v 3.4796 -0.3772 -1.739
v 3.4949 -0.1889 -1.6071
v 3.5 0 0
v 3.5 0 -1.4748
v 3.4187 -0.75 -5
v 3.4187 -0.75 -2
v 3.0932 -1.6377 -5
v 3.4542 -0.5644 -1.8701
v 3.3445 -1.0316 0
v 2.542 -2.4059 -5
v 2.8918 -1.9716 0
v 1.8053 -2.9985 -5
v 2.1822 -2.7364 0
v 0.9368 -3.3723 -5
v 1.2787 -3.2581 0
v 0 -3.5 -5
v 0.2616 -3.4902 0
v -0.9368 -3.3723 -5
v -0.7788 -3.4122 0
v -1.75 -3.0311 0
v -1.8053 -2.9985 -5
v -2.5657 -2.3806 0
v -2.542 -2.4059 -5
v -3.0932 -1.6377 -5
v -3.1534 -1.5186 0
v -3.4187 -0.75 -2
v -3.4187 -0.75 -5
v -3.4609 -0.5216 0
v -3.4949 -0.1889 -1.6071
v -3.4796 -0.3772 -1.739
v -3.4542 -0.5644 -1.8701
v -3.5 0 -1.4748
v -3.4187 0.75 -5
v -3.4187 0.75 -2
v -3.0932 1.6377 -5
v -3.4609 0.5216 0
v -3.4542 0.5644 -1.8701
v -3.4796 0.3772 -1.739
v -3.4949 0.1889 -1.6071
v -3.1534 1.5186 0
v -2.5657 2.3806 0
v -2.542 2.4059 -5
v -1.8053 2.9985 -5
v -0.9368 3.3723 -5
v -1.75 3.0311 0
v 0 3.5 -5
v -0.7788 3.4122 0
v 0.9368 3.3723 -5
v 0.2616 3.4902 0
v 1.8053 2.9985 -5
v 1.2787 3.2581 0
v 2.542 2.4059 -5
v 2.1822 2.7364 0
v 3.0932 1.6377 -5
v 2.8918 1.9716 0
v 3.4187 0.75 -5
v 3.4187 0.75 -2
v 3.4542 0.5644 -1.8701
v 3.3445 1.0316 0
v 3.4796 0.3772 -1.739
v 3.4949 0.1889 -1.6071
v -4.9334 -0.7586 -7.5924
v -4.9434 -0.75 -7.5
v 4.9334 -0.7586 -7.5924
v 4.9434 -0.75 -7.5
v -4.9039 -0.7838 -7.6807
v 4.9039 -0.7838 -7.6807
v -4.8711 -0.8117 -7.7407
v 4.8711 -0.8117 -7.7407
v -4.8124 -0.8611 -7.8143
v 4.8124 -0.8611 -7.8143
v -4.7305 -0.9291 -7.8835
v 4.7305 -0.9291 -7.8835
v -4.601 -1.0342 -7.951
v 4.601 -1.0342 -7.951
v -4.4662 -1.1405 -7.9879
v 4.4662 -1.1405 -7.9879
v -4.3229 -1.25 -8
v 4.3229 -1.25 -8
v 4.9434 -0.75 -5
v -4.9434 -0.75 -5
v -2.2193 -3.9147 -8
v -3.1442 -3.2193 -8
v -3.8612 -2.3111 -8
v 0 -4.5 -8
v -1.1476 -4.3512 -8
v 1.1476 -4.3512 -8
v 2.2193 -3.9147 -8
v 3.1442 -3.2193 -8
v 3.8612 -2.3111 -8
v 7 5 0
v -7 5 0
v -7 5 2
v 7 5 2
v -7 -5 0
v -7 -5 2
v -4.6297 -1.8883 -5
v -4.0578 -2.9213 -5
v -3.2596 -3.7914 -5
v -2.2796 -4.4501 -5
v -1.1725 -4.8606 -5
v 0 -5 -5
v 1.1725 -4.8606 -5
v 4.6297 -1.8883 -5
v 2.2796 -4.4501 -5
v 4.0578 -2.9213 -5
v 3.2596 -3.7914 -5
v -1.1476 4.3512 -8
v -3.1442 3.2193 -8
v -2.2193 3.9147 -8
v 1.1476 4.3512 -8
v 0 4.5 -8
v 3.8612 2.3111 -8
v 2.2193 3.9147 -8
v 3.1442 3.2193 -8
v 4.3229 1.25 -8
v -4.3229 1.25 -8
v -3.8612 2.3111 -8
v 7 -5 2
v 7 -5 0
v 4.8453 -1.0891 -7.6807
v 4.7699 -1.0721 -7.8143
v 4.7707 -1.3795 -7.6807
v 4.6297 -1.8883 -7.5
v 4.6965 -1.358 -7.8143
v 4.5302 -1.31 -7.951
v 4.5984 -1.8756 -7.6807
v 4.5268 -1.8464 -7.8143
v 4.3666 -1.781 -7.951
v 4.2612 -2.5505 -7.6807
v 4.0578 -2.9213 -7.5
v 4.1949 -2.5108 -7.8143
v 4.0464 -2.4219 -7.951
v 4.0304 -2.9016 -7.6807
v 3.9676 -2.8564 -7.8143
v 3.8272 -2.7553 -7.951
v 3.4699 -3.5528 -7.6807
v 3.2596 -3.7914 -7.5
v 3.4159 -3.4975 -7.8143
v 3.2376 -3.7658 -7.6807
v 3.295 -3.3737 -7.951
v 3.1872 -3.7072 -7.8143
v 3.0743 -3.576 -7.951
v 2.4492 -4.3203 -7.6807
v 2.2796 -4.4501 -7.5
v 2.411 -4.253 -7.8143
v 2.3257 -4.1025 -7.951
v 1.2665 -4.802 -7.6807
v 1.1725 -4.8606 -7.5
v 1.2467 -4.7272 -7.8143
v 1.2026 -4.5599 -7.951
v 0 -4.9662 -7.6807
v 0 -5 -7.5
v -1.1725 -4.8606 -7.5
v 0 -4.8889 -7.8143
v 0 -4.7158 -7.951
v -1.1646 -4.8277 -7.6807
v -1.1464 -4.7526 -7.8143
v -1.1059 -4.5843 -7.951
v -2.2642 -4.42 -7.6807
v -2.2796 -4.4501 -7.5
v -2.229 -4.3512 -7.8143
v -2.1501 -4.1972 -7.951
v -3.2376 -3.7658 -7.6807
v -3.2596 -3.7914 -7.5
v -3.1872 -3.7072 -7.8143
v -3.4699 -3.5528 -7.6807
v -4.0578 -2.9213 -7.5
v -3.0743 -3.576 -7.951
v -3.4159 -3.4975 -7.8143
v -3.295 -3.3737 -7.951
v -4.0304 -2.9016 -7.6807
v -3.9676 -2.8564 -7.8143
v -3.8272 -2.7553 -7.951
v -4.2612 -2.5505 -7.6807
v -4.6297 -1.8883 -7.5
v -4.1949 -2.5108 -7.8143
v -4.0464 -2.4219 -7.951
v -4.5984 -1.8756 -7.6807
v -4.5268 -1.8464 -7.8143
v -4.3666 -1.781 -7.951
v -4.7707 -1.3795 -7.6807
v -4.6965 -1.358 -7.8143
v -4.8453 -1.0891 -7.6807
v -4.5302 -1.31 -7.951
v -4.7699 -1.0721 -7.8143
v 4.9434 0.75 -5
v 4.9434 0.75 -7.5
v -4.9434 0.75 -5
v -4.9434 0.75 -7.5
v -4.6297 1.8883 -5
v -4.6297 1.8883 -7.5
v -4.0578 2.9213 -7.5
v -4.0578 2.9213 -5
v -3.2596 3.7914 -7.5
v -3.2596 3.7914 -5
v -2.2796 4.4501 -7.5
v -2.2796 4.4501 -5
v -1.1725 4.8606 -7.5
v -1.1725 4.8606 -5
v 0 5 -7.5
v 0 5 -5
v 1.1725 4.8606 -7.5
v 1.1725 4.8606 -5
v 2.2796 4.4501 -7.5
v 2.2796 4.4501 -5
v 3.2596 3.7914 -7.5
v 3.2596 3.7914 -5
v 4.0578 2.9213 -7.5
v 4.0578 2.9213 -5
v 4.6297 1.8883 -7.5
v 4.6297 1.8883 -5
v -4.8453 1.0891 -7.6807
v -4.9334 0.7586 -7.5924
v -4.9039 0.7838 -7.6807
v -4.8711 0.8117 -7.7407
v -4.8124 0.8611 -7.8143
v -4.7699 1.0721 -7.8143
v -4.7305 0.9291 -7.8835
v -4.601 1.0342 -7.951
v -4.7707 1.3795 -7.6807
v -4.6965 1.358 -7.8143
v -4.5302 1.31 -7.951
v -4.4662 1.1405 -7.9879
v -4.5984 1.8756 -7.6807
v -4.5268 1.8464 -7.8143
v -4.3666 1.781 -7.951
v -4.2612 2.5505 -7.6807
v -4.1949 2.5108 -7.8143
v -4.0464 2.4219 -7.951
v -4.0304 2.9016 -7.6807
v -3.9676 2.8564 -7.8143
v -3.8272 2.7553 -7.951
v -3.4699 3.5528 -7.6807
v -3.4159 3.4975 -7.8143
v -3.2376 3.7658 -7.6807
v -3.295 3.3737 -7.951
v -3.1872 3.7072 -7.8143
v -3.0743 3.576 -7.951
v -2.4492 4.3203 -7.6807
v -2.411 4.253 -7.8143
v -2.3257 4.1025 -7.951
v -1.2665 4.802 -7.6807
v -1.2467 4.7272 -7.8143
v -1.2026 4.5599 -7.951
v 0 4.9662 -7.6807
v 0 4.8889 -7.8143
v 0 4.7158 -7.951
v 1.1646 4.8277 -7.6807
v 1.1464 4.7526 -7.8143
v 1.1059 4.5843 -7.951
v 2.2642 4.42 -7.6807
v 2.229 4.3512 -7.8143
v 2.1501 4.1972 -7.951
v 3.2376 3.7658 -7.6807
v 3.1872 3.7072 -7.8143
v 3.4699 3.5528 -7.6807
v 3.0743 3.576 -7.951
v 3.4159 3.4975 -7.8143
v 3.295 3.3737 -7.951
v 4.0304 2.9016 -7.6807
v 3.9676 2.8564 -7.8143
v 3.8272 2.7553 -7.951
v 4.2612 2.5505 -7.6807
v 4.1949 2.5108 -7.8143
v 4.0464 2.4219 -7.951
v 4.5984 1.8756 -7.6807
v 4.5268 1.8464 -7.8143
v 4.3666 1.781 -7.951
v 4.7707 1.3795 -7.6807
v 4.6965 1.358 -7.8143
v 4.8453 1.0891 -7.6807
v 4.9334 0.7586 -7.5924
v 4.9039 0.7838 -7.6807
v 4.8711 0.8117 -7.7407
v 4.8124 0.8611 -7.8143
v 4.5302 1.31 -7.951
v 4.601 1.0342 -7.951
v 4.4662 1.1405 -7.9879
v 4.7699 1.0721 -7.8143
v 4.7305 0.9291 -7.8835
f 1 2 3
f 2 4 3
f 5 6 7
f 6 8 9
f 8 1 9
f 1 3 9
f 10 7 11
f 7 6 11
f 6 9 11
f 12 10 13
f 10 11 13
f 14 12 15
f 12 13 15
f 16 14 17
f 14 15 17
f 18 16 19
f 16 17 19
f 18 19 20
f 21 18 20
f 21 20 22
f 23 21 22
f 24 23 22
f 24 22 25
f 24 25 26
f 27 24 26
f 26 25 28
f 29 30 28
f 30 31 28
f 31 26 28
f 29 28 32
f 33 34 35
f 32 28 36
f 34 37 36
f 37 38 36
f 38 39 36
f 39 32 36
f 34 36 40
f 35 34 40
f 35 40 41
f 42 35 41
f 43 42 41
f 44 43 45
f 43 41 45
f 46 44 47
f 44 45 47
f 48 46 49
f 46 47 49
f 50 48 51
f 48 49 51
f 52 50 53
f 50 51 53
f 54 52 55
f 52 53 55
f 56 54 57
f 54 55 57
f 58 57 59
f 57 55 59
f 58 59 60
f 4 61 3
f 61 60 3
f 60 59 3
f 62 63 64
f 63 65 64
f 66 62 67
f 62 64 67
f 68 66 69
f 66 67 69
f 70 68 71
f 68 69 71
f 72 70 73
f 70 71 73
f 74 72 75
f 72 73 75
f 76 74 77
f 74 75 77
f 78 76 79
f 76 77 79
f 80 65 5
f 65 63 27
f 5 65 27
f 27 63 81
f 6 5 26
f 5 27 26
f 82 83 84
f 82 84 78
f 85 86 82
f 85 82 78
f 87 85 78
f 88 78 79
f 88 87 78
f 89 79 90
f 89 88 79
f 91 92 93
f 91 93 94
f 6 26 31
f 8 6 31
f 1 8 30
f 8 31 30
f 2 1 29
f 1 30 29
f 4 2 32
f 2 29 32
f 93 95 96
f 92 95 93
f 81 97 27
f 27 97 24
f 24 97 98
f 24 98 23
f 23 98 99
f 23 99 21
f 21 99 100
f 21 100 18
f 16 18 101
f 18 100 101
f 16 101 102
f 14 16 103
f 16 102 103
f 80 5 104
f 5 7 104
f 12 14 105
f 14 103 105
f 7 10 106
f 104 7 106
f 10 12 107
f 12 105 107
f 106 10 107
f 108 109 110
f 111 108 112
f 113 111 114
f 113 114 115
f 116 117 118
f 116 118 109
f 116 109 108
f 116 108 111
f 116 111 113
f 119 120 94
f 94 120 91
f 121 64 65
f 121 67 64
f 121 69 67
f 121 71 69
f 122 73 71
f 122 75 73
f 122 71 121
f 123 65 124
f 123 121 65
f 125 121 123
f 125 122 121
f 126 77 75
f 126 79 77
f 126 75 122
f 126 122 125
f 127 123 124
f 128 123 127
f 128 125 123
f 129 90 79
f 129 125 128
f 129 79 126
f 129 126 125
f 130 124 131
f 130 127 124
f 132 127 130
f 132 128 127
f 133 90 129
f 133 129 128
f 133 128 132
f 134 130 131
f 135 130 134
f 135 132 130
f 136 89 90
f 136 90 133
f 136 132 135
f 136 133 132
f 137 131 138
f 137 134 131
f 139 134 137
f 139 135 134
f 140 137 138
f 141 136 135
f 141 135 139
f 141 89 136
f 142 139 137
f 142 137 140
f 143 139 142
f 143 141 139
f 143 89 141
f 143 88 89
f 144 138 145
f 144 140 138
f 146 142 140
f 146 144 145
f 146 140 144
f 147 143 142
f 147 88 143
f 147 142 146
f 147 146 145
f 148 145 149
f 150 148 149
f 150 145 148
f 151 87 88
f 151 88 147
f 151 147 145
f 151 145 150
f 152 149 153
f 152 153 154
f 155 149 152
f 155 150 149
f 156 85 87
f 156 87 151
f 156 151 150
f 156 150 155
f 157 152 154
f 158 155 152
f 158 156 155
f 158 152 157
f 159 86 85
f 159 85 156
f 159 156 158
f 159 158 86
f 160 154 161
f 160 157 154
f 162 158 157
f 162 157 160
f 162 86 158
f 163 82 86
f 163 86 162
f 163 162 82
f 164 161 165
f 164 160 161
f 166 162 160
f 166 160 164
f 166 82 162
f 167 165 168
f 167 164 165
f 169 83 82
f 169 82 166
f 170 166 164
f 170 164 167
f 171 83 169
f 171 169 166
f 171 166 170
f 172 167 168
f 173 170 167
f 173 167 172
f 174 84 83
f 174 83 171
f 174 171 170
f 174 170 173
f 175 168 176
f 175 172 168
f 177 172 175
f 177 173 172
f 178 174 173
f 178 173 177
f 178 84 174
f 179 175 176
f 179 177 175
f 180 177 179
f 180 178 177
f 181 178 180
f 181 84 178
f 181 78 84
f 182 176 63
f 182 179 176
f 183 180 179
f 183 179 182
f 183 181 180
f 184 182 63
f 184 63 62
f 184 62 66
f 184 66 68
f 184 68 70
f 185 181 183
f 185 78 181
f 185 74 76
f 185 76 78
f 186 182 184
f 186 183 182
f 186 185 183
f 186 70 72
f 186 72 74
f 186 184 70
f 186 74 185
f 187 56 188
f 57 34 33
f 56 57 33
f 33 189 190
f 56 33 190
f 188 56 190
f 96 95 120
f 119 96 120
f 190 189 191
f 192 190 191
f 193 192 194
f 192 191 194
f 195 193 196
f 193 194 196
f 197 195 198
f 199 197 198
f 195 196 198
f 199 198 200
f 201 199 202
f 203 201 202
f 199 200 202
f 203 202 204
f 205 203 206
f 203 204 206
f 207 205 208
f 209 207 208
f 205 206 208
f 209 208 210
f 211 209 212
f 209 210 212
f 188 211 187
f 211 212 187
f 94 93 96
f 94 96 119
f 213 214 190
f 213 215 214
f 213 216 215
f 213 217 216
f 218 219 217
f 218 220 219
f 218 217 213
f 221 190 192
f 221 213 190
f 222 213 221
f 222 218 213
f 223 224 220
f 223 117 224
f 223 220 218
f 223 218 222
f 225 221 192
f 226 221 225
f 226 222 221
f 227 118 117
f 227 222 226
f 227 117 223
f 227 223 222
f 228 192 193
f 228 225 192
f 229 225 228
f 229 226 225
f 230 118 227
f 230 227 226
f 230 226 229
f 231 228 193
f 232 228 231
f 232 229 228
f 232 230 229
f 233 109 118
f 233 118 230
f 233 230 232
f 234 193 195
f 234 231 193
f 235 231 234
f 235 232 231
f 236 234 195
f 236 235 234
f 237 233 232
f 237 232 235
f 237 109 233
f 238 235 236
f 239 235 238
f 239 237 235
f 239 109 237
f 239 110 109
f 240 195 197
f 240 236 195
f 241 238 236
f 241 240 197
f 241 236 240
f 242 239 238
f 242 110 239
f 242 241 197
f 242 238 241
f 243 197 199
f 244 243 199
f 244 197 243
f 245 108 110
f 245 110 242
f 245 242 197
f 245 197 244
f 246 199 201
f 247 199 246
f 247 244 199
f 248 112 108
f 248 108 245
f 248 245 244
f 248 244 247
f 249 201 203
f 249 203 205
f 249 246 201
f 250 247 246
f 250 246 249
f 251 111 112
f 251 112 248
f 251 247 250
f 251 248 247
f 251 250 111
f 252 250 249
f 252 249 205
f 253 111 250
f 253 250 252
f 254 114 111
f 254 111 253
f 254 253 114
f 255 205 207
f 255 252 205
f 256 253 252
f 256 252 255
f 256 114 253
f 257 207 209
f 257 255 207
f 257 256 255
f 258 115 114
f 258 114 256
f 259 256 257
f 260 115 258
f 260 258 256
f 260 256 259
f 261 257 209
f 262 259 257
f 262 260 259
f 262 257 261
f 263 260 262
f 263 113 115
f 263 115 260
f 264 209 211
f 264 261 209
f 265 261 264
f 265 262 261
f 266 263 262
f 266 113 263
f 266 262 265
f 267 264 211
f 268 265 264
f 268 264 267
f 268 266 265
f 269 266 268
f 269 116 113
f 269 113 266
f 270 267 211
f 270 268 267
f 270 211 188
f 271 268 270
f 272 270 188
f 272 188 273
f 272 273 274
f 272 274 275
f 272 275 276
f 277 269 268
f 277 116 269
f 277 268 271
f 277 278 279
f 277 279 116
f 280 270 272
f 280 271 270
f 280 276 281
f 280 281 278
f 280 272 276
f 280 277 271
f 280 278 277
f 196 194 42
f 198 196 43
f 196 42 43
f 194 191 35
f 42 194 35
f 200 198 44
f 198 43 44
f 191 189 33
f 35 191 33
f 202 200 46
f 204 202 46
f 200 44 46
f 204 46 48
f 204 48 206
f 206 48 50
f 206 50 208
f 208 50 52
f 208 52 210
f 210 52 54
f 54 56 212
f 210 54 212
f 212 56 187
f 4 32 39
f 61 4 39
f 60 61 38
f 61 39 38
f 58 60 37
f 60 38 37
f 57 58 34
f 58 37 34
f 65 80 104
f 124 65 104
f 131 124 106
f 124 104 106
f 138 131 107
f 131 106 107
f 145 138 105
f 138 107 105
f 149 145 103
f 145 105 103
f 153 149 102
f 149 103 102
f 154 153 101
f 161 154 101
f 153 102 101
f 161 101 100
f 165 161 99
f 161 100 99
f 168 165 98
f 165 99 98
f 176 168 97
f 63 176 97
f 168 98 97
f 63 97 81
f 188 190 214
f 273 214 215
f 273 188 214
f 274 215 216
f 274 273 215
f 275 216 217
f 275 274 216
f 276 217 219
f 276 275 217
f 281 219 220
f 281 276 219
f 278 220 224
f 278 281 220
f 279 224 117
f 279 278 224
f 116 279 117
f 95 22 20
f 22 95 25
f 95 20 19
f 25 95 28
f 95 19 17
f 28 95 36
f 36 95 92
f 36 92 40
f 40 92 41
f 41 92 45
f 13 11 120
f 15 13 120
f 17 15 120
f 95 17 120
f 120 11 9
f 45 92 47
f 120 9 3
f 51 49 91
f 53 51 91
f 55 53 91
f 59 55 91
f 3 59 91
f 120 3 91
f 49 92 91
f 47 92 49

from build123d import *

# Parameters (mm, degrees)
SKETCH087_W     = 14
SKETCH087_H     = 10
PAD045_DEPTH    = 2
SKETCH088_R     = 3.5
PAD046_DEPTH    = 5
SKETCH089_R     = 5
PAD047_DEPTH    = 3
POCKET037_DEPTH = 14
FILLET007_R     = 0.5


with BuildPart() as part:
    # Sketch087 → Pad045 (new body)
    with BuildSketch(Plane.XY):
        Rectangle(SKETCH087_W, SKETCH087_H)
    extrude(amount=PAD045_DEPTH)

    # Sketch088 (on Face5 of Pad045) → Pad046 (join)
    with BuildSketch(Plane(origin=(0, 0, 0), x_dir=(1, 0, 0), z_dir=(0, 0, -1))):
        Circle(SKETCH088_R)
    extrude(amount=PAD046_DEPTH)

    # Sketch089 (on Face8 of Pad046) → Pad047 (join)
    with BuildSketch(Plane(origin=(0, 0, -5), x_dir=(1, 0, 0), z_dir=(0, 0, -1))):
        Circle(SKETCH089_R)
    extrude(amount=PAD047_DEPTH)

    # Sketch090 (on Face1 of Pad047) → Pocket037 (cut)
    with BuildSketch(Plane(origin=(-7, 0, 0), x_dir=(0, -1, 0), z_dir=(-1, 0, 0))):
        Polygon((-0.75, -2), (-0.75, -8), (0.75, -8), (0.75, -2), (0, -1.474844), align=None)
    extrude(amount=-POCKET037_DEPTH, mode=Mode.SUBTRACT)

    # Fillet007
    fillet007_edges = [part.edges().sort_by_distance(p)[0] for p in [
        (0, -5, -8),
        (0, -0.75, -8),
        (0, 0.75, -8),
        (0, 5, -8),
    ]]
    fillet(fillet007_edges, radius=FILLET007_R)


solid = part.part
